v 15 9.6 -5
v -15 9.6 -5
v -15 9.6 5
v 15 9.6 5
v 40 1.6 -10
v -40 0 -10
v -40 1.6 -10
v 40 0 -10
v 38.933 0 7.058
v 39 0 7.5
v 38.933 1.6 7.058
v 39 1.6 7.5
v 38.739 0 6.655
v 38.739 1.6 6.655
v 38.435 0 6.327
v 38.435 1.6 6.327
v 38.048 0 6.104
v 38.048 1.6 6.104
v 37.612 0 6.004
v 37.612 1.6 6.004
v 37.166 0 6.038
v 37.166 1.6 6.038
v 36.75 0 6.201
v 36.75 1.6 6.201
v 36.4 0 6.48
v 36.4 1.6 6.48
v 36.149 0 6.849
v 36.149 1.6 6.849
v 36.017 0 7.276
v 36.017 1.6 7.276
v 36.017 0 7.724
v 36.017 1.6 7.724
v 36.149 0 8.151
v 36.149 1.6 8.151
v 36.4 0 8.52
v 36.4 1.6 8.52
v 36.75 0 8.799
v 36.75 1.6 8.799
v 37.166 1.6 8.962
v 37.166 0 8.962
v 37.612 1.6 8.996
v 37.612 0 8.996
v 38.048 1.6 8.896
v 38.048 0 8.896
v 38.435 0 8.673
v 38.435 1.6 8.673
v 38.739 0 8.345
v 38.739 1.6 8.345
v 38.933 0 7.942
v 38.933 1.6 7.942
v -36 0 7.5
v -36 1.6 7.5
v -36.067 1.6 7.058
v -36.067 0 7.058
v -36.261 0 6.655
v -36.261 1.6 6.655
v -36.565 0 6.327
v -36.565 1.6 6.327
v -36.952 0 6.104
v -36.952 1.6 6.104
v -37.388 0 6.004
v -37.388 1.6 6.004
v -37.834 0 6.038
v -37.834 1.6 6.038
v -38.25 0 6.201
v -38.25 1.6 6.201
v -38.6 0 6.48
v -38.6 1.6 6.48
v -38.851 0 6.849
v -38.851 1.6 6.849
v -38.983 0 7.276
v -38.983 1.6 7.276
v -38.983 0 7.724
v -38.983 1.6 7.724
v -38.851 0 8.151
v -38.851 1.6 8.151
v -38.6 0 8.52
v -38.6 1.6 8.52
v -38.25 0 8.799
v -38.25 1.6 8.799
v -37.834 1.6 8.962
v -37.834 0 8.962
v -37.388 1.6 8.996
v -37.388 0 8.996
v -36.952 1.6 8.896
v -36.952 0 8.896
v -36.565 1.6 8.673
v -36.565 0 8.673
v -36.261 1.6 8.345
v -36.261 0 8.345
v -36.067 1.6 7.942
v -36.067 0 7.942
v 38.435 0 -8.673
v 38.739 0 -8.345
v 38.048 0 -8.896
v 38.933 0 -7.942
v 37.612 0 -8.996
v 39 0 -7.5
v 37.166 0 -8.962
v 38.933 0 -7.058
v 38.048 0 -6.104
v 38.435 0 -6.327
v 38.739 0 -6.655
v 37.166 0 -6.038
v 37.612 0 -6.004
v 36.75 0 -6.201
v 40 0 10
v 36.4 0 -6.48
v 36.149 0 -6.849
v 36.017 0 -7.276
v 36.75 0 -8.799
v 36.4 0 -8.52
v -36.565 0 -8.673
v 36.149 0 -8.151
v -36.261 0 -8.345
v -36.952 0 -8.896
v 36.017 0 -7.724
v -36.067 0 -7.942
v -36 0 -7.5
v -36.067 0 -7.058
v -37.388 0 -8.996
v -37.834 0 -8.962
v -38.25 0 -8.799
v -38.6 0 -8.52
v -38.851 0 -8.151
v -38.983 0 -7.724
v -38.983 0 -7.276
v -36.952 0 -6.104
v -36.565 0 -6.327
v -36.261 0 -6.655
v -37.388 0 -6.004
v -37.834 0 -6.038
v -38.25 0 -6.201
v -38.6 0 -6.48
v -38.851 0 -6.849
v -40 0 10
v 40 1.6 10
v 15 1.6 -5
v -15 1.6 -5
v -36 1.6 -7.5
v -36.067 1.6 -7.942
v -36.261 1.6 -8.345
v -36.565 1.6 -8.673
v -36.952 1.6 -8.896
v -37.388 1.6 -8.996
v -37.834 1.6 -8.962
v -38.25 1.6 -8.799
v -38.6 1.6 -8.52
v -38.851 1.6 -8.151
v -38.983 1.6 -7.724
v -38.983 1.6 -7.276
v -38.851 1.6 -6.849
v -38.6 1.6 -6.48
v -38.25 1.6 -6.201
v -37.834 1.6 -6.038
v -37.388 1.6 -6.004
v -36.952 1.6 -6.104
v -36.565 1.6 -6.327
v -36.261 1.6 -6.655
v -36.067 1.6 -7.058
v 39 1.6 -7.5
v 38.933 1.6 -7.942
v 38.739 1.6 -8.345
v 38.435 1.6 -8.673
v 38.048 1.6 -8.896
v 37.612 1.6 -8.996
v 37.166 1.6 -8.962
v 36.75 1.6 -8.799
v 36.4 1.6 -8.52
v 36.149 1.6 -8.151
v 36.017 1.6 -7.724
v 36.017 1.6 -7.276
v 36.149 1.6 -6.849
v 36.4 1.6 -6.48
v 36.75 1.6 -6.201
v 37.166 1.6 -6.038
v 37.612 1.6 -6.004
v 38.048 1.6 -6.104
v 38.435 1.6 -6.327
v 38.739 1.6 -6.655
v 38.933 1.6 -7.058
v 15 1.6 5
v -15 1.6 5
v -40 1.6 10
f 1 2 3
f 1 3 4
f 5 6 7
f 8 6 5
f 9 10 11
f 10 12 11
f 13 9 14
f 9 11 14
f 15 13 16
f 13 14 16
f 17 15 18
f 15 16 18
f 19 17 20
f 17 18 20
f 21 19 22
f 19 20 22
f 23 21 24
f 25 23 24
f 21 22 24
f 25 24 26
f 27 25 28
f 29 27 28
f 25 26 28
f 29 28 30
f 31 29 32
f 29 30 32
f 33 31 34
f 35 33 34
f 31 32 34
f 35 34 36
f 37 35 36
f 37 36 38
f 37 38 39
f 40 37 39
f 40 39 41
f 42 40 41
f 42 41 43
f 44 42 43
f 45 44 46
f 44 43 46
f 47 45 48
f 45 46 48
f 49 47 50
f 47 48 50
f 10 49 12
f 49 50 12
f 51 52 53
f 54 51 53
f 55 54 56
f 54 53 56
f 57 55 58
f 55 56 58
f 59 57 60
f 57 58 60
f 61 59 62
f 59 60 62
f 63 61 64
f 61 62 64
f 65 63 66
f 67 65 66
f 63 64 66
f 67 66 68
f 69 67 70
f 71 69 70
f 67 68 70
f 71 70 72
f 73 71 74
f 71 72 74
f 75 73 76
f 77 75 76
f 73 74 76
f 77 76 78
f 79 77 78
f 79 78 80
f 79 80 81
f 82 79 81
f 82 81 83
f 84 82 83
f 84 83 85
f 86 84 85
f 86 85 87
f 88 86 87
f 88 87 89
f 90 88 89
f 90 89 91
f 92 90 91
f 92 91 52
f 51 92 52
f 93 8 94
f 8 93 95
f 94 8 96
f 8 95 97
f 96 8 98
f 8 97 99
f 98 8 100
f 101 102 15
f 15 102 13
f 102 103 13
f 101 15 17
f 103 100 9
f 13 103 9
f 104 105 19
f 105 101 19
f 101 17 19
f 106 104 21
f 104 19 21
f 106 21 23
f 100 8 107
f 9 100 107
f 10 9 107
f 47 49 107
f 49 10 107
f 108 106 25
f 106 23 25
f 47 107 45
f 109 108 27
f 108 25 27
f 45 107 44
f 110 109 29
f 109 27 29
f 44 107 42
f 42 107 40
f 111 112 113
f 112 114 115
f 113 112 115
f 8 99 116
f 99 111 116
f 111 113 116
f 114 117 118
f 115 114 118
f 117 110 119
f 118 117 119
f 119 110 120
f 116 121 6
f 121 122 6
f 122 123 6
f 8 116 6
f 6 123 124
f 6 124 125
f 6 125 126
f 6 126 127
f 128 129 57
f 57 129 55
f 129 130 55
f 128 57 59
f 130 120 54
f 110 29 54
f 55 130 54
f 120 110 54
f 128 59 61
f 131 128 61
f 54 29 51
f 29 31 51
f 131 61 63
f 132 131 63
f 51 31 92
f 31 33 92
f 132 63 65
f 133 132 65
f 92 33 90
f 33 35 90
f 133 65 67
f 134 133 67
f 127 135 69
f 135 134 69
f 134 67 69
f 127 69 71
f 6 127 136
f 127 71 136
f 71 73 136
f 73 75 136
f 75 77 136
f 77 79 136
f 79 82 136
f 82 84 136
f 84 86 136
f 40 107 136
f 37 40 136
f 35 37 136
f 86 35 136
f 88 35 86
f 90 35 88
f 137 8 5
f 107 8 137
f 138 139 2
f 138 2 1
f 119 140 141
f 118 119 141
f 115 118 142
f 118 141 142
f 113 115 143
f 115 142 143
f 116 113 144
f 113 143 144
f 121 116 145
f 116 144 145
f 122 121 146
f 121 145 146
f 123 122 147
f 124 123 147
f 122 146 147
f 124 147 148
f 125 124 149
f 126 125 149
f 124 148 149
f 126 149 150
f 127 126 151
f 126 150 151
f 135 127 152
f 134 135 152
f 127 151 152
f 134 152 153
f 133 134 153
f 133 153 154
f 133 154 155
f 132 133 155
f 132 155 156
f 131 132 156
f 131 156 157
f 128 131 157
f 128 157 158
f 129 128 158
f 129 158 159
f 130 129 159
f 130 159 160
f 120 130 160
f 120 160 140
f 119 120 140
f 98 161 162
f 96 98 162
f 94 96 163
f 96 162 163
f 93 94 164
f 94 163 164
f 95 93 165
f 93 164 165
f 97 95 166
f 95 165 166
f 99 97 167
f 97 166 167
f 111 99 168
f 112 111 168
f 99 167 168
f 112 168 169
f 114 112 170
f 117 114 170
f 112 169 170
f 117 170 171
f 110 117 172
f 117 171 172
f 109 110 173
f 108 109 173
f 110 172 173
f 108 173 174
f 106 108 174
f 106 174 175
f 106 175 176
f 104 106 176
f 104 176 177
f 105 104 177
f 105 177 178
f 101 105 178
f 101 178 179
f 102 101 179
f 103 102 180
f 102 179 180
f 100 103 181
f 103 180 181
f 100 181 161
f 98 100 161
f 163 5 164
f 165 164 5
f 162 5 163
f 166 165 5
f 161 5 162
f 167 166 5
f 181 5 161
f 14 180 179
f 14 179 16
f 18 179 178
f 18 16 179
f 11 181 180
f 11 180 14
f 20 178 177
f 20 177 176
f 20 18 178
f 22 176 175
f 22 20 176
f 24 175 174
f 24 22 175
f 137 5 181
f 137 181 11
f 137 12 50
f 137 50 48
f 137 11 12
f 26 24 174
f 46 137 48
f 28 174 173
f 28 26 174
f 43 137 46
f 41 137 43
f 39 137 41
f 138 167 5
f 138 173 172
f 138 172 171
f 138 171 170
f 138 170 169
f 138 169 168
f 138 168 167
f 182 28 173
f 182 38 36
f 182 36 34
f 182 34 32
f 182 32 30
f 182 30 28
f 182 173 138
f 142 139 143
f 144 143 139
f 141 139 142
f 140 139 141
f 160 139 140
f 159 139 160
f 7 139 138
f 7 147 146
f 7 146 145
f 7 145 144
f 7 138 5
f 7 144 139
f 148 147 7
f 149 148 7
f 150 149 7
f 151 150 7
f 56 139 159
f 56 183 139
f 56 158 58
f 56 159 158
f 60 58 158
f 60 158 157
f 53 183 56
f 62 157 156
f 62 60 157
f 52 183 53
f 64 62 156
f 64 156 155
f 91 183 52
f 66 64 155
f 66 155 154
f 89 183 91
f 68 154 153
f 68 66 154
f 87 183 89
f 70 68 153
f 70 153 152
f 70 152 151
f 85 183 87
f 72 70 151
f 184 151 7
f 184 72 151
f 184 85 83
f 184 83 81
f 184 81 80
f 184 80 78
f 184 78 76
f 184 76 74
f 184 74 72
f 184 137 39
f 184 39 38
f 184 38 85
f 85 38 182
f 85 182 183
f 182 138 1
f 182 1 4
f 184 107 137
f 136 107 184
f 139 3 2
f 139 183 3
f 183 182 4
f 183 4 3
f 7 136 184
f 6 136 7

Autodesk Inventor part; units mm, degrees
ref_plane "YZ Plane" through (0, 0, 0) normal (1, 0, 0) x (0, 1, 0)
ref_plane "XZ Plane" through (0, 0, 0) normal (0, 1, 0) x (-1, 0, 0)
ref_plane "XY Plane" through (0, 0, 0) normal (0, 0, 1) x (1, 0, 0)
sketch "Эскиз1" plane through (0, 0, 0) normal (0, 1, 0) x (-1, 0, 0)
  line L0 (-40, 10) -> (40, 10)
  line L1 (40, 10) -> (40, -10)
  line L2 (40, -10) -> (-40, -10)
  line L3 (-40, -10) -> (-40, 10)
  line L4 (-40, 10) -> (40, -10) construction
  line L5 (40, 10) -> (-40, -10) construction
  point P0 (0, 0)
  dimension "d0" = 80
  dimension "d1" = 20
extrude "Выдавливание1" add sketch "Эскиз1" along normal blind 1.6
sketch "Эскиз2" plane through (0, 1.6, 0) normal (0, 1, 0) x (1, 0, 0)
  line L0 (-37.5, -7.5) -> (-37.5, 7.5)
  line L1 (37.5, 7.5) -> (37.5, -7.5)
  circle A0 centre (-37.5, -7.5) radius 1.5
  circle A1 centre (-37.5, 7.5) radius 1.5
  circle A2 centre (37.5, 7.5) radius 1.5
  circle A3 centre (37.5, -7.5) radius 1.5
  point P0 (0, 0)
  dimension "d4" = 75
  dimension "d5" = 15
  dimension "d6" = 3
  dimension "d7" = 3
  dimension "d8" = 3
  dimension "d9" = 3
extrude "Выдавливание2" cut sketch "Эскиз2" against normal blind 1.6
sketch "Эскиз3" plane through (0, 1.6, 0) normal (0, 1, 0) x (1, 0, 0)
  line L0 (15, -5) -> (-15, -5)
  line L1 (-15, -5) -> (-15, 5)
  line L2 (-15, 5) -> (15, 5)
  line L3 (15, 5) -> (15, -5)
  line L4 (15, -5) -> (-15, 5) construction
  line L5 (-15, -5) -> (15, 5) construction
  point P0 (0, 0)
  dimension "d12" = 30
  dimension "d13" = 10
extrude "Выдавливание3" add sketch "Эскиз3" along normal blind 8
properties part number "КВ33.044.1003 - Плата контроля сервомоторами" material "Серебро"
